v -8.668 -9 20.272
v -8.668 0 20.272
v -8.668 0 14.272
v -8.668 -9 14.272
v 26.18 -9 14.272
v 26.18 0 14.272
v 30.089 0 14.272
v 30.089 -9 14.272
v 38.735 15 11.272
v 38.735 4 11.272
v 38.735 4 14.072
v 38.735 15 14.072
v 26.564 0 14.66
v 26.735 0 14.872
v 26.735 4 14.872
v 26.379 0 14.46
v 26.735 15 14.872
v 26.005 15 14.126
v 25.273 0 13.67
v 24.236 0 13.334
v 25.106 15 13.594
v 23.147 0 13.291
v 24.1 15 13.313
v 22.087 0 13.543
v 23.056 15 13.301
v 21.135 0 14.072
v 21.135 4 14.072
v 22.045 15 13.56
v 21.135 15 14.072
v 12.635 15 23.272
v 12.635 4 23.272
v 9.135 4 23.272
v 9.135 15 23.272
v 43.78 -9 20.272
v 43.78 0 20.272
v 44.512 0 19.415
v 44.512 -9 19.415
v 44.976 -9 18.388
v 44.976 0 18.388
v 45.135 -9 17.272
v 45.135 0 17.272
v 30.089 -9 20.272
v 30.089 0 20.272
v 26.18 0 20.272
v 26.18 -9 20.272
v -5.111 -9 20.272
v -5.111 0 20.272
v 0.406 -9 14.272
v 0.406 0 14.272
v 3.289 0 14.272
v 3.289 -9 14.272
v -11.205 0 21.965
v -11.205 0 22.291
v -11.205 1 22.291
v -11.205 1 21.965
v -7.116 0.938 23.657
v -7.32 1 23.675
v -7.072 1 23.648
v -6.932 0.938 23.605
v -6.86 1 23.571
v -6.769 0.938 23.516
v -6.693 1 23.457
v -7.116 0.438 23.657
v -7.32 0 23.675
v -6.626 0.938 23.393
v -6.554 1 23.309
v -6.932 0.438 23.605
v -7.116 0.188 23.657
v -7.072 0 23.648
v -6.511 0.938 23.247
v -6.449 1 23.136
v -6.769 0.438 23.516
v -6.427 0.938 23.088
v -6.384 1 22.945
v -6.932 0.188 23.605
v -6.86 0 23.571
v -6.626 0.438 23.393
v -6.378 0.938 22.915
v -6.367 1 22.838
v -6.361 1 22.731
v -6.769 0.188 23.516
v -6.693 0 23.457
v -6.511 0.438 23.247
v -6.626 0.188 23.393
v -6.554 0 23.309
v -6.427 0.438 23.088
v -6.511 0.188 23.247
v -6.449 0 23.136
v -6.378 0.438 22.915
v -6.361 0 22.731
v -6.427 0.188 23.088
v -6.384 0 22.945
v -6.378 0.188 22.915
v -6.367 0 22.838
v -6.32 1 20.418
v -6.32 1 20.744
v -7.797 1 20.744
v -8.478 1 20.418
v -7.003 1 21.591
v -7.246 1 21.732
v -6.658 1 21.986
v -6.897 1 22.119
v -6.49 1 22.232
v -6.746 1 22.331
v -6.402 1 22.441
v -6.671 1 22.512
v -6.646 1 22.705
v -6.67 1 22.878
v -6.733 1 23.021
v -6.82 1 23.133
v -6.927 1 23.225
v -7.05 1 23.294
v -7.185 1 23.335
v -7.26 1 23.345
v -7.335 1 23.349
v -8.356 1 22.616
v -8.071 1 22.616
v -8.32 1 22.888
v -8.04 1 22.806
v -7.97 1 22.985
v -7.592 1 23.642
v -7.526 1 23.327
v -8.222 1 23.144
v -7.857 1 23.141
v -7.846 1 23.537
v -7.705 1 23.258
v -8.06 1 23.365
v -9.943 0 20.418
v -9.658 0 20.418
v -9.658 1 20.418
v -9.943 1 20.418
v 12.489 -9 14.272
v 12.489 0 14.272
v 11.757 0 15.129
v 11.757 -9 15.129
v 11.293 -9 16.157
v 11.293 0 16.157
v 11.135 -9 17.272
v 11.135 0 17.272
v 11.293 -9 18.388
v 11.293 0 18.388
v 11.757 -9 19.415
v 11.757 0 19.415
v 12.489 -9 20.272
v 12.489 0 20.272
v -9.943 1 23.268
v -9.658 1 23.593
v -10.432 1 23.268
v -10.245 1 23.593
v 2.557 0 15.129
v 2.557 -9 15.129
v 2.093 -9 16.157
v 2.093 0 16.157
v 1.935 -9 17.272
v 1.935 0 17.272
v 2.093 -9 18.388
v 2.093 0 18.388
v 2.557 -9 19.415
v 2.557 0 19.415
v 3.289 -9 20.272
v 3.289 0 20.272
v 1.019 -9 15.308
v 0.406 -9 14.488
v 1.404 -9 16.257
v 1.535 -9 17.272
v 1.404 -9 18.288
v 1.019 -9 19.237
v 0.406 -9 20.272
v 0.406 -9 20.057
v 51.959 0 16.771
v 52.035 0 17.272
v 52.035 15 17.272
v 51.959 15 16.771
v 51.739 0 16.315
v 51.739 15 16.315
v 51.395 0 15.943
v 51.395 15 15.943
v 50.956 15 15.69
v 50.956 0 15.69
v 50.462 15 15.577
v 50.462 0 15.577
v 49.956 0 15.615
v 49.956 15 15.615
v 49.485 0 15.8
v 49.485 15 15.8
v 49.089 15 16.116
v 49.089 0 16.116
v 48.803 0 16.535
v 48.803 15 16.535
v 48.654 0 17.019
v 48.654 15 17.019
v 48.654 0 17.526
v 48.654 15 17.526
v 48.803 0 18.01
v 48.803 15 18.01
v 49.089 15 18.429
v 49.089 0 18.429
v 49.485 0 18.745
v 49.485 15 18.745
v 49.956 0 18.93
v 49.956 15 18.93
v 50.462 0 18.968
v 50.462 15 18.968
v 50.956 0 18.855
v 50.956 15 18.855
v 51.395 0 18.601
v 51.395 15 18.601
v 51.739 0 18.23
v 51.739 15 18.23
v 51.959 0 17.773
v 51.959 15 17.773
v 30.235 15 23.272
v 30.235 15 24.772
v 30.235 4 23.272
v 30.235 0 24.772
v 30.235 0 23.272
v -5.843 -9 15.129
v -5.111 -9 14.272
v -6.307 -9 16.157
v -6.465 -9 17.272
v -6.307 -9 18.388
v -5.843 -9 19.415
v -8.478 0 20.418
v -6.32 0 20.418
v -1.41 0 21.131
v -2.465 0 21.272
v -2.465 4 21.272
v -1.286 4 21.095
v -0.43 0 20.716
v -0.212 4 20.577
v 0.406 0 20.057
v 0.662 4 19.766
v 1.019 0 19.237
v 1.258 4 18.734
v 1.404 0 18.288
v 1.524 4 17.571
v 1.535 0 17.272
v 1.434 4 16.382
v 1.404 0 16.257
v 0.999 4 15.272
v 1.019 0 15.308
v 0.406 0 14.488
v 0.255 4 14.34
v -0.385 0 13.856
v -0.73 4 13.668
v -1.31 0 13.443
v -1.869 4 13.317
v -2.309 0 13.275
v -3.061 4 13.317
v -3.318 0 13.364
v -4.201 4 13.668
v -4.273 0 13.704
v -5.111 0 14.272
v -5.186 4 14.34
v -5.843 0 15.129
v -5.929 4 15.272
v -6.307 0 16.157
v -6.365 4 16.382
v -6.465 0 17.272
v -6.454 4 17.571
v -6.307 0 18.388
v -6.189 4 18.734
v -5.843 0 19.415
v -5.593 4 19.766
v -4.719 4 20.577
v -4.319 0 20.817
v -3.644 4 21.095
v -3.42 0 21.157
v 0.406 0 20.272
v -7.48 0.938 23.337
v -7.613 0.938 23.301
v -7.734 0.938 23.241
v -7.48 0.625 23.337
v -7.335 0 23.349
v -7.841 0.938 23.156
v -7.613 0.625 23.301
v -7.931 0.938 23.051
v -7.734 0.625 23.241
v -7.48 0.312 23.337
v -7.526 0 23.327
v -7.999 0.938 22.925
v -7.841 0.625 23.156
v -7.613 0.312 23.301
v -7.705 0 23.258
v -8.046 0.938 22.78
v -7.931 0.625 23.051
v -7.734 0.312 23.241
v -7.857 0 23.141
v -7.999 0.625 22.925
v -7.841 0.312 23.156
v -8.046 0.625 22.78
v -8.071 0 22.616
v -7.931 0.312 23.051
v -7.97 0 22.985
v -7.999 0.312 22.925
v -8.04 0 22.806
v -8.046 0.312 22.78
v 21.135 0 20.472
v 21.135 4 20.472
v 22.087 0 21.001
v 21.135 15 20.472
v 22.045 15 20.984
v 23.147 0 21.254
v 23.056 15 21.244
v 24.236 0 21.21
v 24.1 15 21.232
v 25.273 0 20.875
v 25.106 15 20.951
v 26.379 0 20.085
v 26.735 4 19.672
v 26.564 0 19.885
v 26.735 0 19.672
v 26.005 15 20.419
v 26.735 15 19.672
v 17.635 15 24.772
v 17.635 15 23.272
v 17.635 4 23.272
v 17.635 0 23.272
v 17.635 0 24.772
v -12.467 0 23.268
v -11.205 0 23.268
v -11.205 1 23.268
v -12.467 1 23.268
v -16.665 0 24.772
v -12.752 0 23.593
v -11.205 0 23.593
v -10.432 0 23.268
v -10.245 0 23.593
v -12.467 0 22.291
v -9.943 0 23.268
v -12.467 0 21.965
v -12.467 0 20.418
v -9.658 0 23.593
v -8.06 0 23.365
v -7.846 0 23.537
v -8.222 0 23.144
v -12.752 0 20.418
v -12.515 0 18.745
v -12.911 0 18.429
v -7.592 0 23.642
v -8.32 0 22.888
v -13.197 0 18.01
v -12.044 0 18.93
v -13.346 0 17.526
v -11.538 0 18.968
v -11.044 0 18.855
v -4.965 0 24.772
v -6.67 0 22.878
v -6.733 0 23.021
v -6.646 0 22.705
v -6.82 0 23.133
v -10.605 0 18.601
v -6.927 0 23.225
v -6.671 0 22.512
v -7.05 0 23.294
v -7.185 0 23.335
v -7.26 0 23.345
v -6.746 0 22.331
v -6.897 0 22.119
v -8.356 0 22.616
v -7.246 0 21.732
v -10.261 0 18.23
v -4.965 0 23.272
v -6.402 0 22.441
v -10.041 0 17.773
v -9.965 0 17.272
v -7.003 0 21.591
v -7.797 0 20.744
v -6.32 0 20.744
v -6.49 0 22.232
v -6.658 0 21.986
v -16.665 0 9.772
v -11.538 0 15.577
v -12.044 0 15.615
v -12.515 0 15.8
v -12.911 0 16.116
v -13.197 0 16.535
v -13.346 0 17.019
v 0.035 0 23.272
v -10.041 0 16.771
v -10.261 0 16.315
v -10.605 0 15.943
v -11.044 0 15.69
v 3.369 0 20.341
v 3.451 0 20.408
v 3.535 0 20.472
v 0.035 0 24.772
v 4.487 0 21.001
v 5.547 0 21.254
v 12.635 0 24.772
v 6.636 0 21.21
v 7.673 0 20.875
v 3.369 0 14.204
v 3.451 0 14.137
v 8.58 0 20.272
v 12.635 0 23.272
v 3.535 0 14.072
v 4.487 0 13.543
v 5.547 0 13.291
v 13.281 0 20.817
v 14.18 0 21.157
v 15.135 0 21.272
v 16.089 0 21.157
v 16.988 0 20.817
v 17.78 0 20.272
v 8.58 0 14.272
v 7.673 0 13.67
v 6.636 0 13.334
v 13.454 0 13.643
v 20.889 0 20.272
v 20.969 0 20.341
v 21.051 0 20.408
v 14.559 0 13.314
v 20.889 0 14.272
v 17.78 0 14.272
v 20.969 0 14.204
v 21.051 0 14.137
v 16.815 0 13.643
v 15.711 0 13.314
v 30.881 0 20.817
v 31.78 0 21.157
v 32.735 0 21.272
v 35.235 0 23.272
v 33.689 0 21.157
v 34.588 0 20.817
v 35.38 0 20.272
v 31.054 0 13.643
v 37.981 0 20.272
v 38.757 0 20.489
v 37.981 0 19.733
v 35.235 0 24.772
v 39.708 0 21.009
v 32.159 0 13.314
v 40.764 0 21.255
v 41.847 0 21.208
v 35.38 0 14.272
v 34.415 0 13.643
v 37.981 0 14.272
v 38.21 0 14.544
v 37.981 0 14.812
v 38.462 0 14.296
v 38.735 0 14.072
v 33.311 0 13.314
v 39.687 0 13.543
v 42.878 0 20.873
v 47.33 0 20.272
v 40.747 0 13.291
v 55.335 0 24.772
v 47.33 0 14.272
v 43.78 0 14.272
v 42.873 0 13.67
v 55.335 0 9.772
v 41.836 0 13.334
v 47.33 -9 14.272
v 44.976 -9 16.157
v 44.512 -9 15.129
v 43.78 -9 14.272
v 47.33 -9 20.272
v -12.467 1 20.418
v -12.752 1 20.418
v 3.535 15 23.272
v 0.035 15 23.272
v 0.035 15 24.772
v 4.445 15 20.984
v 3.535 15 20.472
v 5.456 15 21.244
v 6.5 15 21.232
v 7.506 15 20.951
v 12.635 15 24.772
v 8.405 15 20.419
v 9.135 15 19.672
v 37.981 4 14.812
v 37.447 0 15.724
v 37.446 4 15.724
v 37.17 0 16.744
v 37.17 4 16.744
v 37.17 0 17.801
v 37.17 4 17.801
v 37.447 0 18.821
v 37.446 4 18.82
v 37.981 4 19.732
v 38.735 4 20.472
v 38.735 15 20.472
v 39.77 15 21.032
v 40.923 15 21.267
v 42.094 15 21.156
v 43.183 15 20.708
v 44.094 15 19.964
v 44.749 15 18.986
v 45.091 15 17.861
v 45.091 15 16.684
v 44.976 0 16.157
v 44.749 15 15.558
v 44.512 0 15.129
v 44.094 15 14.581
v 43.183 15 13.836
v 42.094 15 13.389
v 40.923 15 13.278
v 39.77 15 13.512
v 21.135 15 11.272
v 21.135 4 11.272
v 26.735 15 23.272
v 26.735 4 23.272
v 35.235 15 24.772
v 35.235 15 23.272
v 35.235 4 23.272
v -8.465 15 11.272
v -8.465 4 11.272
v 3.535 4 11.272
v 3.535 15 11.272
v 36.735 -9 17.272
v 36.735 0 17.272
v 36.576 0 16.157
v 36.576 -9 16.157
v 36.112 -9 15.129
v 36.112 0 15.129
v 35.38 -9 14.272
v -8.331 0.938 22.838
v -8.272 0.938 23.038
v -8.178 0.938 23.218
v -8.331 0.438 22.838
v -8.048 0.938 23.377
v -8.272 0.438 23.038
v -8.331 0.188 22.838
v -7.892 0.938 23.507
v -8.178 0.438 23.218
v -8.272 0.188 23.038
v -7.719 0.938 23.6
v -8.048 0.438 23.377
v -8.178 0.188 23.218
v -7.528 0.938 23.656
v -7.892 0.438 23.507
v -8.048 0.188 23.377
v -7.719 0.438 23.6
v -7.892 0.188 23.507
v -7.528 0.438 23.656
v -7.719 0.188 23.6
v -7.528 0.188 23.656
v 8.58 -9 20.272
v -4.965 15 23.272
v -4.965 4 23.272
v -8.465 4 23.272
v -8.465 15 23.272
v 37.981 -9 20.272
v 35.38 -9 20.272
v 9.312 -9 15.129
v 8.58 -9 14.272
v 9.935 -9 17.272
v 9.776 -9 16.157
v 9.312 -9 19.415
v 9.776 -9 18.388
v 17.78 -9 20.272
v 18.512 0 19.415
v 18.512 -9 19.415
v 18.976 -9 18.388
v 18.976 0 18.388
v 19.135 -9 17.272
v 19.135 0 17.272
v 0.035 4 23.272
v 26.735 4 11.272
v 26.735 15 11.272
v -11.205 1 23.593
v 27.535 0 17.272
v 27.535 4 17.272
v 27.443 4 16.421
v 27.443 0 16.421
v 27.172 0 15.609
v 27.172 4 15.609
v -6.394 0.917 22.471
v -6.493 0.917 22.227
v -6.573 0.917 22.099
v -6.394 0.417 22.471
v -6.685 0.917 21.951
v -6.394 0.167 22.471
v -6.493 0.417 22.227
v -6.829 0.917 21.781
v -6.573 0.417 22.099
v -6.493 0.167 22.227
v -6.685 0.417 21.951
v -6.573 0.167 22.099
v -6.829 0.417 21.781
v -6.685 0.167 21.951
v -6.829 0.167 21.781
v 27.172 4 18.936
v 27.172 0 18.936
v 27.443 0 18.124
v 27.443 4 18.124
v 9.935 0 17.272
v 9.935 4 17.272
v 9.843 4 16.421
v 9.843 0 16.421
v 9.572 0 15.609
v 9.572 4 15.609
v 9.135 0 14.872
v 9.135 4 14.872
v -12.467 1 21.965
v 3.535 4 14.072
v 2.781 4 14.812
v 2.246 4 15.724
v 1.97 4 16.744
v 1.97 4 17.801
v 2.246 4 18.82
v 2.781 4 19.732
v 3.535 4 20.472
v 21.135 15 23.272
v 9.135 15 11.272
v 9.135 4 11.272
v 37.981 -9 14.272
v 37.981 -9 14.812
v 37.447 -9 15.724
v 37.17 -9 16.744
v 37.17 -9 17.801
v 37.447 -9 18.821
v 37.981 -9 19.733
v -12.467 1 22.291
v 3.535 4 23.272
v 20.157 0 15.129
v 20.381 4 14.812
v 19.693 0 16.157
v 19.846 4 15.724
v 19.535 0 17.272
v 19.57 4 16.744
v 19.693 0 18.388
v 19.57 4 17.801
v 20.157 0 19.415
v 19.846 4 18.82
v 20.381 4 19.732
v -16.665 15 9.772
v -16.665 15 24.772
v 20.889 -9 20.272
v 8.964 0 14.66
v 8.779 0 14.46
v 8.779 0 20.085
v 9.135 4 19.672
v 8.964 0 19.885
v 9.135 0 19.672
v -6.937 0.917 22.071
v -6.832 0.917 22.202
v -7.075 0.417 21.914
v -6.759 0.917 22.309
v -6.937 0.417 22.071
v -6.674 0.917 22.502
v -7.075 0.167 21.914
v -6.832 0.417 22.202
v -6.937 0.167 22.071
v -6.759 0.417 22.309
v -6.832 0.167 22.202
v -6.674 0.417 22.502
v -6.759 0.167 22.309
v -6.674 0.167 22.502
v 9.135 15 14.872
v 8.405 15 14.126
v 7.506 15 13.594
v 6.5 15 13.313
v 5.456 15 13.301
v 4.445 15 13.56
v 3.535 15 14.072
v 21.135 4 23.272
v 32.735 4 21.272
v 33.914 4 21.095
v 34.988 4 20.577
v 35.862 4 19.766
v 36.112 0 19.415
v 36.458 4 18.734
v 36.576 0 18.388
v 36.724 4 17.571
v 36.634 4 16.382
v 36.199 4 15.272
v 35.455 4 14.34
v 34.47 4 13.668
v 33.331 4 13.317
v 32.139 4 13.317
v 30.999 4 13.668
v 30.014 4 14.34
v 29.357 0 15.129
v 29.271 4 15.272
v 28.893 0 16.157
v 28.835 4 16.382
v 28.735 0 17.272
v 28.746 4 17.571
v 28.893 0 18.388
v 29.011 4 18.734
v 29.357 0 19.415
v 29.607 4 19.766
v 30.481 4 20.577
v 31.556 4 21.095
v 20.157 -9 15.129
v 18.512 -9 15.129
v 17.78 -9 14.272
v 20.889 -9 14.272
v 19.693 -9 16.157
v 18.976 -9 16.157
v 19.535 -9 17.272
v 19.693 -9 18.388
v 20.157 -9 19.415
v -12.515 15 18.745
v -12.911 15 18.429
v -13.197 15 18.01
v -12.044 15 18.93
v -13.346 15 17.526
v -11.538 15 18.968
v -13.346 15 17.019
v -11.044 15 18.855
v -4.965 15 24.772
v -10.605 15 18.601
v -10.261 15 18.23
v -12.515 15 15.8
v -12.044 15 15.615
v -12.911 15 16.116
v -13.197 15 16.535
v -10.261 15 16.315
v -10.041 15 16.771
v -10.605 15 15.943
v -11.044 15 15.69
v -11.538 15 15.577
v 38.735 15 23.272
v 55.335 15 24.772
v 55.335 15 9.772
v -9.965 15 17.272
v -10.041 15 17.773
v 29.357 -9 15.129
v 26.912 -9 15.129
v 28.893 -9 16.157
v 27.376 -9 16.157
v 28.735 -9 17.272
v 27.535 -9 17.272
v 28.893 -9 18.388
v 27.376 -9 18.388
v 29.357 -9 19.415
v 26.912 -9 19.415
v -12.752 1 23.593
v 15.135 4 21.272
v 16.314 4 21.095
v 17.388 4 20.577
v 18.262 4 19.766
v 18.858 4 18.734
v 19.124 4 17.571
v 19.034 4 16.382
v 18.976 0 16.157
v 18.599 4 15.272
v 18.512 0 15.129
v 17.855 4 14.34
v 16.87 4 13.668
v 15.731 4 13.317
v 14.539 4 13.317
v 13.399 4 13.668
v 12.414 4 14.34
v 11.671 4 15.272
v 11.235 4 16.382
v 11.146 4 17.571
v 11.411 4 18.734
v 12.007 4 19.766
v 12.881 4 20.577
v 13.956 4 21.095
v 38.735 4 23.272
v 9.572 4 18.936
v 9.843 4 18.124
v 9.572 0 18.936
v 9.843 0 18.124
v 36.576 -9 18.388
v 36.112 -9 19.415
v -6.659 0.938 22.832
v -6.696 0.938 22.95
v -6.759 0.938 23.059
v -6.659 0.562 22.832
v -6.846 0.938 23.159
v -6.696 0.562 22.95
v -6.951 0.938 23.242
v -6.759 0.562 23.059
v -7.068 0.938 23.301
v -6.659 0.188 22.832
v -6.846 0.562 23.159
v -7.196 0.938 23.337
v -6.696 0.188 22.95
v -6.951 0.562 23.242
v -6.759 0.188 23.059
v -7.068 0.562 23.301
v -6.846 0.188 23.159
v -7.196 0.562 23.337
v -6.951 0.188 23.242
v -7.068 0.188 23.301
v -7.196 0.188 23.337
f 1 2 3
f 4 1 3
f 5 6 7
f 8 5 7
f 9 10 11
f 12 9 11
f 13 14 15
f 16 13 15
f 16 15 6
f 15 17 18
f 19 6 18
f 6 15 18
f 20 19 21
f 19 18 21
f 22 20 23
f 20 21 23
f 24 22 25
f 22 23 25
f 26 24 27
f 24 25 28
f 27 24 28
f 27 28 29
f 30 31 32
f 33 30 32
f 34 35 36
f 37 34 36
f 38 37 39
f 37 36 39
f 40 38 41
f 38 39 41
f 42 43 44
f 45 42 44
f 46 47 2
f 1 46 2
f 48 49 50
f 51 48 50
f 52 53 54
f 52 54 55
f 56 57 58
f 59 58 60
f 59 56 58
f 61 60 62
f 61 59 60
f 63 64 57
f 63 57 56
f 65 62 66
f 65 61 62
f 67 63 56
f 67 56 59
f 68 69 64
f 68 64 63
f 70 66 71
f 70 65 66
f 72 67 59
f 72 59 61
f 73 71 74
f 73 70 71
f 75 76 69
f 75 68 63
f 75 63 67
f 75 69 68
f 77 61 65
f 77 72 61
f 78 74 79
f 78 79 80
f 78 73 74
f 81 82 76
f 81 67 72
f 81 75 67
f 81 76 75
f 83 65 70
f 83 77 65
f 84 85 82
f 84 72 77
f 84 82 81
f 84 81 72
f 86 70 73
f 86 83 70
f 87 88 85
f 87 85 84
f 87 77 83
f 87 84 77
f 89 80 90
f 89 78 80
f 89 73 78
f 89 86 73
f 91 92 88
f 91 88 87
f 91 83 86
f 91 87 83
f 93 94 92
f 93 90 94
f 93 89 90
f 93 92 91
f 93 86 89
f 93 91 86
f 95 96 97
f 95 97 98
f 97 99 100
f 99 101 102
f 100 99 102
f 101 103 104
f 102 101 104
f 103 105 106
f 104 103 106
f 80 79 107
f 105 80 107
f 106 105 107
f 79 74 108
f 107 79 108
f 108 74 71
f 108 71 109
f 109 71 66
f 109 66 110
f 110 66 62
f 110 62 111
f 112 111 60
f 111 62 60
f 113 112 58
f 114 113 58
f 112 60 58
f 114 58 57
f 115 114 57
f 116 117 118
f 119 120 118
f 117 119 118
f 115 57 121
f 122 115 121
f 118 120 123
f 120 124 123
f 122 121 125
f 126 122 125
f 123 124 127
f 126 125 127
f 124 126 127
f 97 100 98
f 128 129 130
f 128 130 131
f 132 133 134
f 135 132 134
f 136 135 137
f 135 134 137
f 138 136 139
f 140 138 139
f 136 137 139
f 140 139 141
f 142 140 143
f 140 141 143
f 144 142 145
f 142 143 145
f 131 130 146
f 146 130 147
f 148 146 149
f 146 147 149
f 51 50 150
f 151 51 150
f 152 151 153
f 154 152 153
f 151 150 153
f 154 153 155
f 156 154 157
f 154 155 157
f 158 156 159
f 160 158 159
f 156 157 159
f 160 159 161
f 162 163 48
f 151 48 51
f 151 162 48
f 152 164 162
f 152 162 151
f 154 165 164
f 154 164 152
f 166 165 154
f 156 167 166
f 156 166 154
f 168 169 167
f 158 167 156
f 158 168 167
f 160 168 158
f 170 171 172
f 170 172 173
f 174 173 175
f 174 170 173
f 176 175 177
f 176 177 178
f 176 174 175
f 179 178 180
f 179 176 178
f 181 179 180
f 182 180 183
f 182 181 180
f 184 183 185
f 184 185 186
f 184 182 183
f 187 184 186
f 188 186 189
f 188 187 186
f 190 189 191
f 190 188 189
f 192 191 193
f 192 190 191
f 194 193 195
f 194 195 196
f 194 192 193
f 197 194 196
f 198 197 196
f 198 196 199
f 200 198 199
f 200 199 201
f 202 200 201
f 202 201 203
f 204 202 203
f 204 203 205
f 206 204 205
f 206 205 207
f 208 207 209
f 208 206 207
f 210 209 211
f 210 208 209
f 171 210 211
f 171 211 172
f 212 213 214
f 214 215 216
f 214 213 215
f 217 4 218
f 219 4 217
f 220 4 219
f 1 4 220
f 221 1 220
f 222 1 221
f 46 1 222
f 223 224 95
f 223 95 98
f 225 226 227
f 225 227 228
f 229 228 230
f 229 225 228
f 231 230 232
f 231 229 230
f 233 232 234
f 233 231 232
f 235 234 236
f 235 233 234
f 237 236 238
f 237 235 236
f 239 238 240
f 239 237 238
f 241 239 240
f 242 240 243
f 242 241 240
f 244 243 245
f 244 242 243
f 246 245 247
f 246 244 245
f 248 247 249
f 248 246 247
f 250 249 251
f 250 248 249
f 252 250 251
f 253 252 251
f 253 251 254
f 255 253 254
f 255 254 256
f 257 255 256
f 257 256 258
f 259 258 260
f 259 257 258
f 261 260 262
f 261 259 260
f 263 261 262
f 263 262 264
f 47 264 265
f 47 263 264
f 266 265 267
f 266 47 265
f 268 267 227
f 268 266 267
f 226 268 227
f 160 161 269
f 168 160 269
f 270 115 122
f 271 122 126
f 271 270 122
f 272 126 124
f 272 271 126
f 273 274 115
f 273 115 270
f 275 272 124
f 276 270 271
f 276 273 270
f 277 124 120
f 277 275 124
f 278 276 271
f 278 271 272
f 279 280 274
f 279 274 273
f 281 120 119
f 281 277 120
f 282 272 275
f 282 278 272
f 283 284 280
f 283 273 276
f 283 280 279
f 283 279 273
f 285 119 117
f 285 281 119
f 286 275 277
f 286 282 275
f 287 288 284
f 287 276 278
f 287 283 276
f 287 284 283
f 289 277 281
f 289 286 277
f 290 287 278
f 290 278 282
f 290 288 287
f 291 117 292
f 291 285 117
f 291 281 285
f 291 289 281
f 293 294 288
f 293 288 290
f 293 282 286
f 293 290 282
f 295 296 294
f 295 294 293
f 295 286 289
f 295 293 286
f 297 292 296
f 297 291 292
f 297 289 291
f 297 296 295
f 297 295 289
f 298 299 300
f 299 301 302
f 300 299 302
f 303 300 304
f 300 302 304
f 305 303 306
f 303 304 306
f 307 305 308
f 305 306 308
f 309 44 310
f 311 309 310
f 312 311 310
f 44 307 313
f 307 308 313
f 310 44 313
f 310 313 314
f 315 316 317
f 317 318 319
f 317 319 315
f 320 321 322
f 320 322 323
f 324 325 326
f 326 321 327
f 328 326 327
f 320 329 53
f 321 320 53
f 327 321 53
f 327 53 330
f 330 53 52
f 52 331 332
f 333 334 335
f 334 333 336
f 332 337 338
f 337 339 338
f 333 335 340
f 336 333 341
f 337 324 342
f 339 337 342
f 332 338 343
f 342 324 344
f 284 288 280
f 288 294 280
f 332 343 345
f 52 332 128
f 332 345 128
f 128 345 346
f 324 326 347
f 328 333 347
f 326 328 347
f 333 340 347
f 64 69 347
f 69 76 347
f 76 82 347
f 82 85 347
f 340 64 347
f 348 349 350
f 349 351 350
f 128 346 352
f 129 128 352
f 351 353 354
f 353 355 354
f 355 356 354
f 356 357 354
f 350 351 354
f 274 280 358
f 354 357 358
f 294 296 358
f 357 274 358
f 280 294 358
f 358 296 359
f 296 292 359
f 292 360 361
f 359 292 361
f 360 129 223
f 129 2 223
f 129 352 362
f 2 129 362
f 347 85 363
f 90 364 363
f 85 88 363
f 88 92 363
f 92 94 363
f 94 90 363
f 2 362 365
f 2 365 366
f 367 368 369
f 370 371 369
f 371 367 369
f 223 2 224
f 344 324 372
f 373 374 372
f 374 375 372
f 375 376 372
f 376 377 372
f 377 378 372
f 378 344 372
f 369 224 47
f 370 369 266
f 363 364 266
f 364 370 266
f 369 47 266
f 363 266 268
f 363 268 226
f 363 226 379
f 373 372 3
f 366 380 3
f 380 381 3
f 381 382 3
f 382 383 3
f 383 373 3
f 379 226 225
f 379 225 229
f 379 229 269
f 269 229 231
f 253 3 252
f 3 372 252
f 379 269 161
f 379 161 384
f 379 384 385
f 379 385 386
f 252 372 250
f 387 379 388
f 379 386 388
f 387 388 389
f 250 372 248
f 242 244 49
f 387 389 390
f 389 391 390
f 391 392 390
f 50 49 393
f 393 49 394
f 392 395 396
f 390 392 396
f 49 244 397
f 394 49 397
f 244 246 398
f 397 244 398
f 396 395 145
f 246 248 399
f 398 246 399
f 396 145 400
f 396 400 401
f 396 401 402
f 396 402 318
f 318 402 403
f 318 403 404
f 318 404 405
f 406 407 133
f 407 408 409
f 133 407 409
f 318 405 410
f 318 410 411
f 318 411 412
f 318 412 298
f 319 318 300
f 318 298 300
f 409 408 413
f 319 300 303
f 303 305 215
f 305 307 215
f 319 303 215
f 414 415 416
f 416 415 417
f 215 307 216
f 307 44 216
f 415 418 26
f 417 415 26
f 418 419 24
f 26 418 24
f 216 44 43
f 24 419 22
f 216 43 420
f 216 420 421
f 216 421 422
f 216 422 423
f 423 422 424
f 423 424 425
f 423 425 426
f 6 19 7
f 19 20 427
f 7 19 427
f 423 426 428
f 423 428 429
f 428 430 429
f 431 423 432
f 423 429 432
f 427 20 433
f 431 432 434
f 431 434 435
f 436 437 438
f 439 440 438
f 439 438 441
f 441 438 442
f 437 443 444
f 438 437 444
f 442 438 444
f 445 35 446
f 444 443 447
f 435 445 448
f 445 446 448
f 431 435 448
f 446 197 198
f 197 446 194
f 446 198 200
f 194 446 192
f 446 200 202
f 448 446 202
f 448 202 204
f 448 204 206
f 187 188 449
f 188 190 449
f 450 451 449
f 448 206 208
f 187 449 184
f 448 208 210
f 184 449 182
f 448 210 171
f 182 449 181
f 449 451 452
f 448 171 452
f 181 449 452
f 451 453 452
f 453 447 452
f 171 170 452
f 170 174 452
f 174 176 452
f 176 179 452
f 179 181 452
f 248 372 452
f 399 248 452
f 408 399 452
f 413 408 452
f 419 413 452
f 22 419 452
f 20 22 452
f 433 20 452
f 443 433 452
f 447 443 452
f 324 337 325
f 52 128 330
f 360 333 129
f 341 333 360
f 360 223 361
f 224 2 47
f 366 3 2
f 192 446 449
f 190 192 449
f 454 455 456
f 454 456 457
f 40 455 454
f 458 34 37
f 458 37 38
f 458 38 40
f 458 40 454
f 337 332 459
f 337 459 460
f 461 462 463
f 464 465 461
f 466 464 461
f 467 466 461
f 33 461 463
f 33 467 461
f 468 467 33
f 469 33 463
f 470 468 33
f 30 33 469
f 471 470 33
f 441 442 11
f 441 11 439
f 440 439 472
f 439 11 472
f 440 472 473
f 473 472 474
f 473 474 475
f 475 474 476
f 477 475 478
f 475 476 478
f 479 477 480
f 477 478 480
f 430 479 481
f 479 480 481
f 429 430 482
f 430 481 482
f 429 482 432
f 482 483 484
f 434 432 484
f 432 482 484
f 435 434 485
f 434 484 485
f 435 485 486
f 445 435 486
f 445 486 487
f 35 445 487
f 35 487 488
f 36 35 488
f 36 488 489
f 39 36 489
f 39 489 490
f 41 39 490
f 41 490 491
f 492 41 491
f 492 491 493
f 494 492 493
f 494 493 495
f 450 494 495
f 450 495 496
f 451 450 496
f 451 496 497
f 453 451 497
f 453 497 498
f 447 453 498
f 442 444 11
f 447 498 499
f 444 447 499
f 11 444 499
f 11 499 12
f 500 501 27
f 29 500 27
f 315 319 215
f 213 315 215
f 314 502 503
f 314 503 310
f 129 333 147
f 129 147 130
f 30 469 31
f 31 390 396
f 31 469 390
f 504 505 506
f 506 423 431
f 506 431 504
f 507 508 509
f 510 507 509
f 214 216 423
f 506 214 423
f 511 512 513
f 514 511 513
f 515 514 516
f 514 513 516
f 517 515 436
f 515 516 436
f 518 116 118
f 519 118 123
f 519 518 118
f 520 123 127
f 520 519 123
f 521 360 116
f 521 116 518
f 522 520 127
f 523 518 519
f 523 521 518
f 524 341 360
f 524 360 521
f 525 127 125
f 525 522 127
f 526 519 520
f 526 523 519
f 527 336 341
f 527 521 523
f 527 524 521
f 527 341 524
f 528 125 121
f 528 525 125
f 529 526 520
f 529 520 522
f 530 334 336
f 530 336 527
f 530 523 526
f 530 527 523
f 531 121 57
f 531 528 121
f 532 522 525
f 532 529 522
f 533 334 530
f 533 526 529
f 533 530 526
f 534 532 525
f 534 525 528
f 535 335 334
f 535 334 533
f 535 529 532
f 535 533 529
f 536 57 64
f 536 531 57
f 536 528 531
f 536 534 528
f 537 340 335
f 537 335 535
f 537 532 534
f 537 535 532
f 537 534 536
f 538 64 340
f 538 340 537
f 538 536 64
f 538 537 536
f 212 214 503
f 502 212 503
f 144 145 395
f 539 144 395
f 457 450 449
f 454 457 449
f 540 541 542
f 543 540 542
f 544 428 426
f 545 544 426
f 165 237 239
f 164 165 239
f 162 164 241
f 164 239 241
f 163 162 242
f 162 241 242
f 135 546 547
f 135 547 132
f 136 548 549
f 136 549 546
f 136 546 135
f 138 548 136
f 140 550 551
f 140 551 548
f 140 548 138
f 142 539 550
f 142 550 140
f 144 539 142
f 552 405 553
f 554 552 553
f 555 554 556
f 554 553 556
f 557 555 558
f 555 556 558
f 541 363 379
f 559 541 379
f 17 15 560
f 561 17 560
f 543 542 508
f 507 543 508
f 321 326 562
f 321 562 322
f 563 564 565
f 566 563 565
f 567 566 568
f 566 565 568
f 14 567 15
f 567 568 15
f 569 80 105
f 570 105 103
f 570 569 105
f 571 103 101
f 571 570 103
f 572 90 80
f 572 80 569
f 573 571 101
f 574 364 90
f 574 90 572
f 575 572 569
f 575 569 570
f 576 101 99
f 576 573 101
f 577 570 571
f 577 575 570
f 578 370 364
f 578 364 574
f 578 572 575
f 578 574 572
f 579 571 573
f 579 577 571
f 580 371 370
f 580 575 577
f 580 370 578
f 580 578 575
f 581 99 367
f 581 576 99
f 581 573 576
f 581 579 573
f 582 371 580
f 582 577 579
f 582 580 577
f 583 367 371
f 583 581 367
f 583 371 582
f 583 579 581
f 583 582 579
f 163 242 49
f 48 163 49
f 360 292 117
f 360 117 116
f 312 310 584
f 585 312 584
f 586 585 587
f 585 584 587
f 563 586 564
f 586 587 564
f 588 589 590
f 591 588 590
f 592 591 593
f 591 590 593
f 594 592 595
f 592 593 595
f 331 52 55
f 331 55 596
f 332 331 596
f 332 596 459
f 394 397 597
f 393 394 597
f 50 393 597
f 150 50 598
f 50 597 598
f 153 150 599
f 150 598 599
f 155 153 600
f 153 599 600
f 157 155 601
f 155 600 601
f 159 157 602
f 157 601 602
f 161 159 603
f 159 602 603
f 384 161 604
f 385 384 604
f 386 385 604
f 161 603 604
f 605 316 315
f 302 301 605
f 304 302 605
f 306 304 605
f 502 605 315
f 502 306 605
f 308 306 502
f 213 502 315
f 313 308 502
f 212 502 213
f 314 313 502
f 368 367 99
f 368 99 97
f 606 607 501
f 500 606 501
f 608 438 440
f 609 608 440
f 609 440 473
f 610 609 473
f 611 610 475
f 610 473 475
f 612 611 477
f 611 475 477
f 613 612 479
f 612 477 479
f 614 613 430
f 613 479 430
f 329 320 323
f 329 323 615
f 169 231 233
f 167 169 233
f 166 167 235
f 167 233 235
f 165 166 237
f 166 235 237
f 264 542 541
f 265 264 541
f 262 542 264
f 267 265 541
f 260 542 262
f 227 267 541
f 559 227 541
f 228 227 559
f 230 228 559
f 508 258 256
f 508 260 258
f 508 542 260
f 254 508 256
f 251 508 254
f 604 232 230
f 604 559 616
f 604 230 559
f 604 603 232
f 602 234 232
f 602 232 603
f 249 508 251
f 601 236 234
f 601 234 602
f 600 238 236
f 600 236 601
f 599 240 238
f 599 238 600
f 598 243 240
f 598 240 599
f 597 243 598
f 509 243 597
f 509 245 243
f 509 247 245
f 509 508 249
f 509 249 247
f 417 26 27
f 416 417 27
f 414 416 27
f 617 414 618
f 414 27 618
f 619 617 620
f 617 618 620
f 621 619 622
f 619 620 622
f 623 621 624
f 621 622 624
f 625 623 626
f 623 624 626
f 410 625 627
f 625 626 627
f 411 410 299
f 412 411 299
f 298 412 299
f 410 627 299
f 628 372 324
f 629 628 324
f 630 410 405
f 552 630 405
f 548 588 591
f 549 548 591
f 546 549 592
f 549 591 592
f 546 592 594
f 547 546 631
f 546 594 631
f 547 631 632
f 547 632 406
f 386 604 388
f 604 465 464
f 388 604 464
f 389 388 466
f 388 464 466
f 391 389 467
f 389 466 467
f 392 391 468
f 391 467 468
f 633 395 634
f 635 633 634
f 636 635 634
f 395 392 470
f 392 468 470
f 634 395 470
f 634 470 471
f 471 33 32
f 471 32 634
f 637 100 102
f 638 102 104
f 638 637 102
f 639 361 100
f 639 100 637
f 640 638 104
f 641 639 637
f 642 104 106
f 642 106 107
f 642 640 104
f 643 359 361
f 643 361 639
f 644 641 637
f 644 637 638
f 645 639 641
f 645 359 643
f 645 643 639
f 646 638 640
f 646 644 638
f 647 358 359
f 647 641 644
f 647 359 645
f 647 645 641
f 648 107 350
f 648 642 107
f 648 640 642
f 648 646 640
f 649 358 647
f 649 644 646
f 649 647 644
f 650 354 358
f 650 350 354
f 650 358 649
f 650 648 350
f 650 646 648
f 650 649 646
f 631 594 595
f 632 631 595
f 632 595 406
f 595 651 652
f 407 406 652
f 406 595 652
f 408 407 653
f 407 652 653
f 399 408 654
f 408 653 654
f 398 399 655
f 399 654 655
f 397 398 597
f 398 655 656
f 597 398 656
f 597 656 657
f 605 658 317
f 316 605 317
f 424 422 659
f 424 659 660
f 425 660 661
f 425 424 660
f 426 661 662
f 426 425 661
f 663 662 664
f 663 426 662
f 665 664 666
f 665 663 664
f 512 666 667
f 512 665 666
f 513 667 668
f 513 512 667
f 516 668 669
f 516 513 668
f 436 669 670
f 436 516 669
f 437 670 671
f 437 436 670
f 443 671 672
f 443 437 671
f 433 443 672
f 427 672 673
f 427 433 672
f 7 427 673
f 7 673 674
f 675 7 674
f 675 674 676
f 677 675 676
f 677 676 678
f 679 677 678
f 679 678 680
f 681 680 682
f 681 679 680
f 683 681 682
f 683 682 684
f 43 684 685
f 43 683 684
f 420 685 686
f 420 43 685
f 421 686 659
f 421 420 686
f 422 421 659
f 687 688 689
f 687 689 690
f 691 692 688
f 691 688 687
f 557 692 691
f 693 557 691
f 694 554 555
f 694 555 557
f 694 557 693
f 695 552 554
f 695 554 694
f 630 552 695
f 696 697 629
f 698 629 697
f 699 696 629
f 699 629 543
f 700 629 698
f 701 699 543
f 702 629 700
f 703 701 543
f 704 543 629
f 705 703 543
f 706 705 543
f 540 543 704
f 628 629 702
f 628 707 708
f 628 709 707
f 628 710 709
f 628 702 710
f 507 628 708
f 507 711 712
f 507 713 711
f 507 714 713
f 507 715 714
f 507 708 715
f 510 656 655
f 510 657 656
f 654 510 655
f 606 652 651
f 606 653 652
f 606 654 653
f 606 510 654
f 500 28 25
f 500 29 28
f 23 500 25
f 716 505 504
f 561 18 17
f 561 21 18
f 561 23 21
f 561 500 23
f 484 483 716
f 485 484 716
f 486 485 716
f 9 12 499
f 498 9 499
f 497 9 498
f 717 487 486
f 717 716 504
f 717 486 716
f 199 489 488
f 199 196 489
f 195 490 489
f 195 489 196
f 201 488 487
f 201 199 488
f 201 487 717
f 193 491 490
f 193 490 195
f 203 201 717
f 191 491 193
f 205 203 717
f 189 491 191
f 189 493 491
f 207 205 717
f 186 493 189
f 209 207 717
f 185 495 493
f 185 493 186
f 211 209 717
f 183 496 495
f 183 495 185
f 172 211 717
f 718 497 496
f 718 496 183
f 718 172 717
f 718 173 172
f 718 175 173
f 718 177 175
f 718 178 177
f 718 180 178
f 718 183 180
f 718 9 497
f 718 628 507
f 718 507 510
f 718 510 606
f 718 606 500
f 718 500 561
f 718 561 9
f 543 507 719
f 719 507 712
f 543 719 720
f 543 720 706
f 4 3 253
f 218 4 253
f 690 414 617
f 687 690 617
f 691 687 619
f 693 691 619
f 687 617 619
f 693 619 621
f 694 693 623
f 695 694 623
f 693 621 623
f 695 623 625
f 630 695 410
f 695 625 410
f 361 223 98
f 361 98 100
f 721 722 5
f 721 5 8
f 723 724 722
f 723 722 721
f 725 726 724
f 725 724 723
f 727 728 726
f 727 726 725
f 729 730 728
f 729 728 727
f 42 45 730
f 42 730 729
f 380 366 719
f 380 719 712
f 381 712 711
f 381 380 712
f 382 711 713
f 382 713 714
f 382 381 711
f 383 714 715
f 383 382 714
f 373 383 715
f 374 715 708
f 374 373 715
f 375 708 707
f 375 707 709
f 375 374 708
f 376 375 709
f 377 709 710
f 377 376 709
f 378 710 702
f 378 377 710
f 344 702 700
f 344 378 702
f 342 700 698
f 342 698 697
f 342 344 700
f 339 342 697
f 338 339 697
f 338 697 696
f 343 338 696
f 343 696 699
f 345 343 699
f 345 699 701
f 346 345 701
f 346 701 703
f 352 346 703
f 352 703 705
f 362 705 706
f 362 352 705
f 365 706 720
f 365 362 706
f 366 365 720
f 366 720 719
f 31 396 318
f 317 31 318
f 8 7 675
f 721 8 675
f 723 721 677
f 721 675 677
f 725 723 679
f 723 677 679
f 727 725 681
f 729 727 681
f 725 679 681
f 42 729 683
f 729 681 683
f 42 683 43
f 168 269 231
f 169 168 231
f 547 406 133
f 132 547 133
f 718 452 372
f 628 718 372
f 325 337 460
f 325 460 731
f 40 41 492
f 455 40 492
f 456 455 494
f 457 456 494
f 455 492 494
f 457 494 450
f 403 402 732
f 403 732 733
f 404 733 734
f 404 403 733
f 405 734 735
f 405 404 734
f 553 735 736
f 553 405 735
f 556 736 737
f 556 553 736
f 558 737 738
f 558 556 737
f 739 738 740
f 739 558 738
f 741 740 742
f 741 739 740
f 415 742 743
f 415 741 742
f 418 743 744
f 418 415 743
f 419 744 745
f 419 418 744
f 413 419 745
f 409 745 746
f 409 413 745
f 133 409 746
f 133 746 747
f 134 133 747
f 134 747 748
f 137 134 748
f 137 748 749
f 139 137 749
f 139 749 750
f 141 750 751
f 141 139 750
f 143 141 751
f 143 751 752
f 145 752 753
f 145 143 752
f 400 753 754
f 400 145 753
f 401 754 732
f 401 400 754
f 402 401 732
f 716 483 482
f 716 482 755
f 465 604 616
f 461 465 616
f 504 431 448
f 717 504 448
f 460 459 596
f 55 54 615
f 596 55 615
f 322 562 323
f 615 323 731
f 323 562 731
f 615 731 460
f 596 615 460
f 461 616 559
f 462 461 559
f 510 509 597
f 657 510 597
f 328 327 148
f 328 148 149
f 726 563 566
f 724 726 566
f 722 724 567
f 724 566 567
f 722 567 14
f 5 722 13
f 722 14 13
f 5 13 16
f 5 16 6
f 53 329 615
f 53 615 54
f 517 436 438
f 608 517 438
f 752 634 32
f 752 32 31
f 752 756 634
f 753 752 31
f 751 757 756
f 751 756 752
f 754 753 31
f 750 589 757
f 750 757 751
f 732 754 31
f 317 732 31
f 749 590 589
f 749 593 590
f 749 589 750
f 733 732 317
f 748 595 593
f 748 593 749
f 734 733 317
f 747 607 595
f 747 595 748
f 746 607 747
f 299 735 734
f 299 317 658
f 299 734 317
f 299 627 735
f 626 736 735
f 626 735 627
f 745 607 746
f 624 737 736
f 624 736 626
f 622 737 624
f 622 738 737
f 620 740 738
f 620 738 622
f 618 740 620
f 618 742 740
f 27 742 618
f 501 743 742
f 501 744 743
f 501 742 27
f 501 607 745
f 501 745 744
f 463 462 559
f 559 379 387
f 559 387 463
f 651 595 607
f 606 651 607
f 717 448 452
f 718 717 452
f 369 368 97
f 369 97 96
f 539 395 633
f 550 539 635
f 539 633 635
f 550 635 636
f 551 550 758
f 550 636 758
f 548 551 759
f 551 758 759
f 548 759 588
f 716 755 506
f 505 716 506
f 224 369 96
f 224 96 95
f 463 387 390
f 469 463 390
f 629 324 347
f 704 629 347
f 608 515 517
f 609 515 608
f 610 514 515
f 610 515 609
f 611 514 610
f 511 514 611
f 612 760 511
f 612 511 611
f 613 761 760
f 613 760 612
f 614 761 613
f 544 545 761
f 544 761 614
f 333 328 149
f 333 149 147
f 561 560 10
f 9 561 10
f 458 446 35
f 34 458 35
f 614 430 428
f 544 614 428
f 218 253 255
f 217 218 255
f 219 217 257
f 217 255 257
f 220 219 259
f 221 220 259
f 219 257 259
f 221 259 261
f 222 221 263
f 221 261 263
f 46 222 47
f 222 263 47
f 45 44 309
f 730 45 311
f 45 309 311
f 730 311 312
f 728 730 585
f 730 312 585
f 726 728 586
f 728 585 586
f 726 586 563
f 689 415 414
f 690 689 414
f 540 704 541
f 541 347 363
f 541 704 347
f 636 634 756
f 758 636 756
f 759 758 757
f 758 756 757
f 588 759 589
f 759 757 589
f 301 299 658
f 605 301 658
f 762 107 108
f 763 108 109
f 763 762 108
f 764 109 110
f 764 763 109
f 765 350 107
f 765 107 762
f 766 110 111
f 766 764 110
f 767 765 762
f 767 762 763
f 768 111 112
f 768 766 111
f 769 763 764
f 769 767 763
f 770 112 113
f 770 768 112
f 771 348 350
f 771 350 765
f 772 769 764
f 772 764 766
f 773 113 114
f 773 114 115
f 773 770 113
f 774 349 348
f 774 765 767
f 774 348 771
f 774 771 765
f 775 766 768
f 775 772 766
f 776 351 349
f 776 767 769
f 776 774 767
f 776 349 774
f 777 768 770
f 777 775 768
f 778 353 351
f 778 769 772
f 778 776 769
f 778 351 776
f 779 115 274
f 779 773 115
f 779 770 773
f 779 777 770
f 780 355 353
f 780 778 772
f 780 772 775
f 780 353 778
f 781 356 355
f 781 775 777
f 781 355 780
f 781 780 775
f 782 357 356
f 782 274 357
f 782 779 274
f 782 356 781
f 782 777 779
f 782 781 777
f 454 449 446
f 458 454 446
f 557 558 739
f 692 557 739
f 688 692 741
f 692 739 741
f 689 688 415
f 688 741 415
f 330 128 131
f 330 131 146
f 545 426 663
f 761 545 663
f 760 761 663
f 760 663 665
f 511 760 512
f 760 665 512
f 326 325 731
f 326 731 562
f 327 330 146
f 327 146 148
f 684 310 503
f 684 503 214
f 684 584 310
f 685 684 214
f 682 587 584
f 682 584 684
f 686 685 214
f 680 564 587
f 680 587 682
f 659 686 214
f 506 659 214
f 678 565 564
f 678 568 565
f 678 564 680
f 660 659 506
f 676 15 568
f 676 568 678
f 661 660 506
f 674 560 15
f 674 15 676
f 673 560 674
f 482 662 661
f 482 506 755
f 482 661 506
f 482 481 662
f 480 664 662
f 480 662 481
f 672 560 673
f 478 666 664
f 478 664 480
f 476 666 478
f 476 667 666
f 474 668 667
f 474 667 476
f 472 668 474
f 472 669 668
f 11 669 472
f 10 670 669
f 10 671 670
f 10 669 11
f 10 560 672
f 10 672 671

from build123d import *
from build123d.topology import SkipClean

# Parameters (mm, degrees)
SKETCH1_W             = 12
SKETCH1_H             = 12
SKETCH1_R             = 4
BOSS_EXTRUDE1_DEPTH   = 4
BOSS_EXTRUDE1_2_DEPTH = 4
BOSS_EXTRUDE1_3_DEPTH = 4
SKETCH1_3_R           = 1.7
BOSS_EXTRUDE2_DEPTH   = 15
SKETCH4_R             = 4
CUT_EXTRUDE1_DEPTH    = 63.454801186
CUT_EXTRUDE2_DEPTH    = 1
BOSS_EXTRUDE4_DEPTH   = 9


with BuildPart() as part:
    # Sketch1 → Boss-Extrude1 (new body)
    with BuildSketch(Plane(origin=(0, 0, 0), x_dir=(1, 0, 0), z_dir=(0, 1, 0))):
        with Locations((32.734732638, -17.272355561)):
            Rectangle(SKETCH1_W, SKETCH1_H)
        with Locations((32.734732638, -17.272355561)):
            Circle(SKETCH1_R, mode=Mode.SUBTRACT)
    extrude(amount=BOSS_EXTRUDE1_DEPTH)



with BuildPart() as body_2:
    # Sketch1 → Boss-Extrude1 2 (new body)
    with BuildSketch(Plane(origin=(0, 0, 0), x_dir=(1, 0, 0), z_dir=(0, 1, 0))):
        with Locations((15.134732638, -17.272354652)):
            Rectangle(SKETCH1_W, SKETCH1_H)
        with Locations((15.134732638, -17.272354652)):
            Circle(SKETCH1_R, mode=Mode.SUBTRACT)
    extrude(amount=BOSS_EXTRUDE1_2_DEPTH)


with BuildPart() as body_3:
    # Sketch1 → Boss-Extrude1 3 (new body)
    with BuildSketch(Plane(origin=(0, 0, 0), x_dir=(1, 0, 0), z_dir=(0, 1, 0))):
        with Locations((-2.465267362, -17.272354652)):
            Rectangle(SKETCH1_W, SKETCH1_H)
        with Locations((-2.465267362, -17.272354652)):
            Circle(SKETCH1_R, mode=Mode.SUBTRACT)
    extrude(amount=BOSS_EXTRUDE1_3_DEPTH)


with BuildPart() as part_1:
    add(part.part)

    add(body_2.part)  # Boss-Extrude2 merges body 2

    add(body_3.part)  # Boss-Extrude2 merges body 3
    # Sketch1<3> → Boss-Extrude2 (add)
    with BuildSketch(Plane(origin=(0, 0, 0), x_dir=(1, 0, 0), z_dir=(0, 1, 0))):
        Polygon((35.234732638, -24.772354652), (55.334732638, -24.772354652), (55.334732638, -9.772354652), (-16.665267362, -9.772354652), (-16.665267362, -24.772354652), (-4.965267362, -24.772354652), (-4.965267362, -23.272354652), (-8.465267362, -23.272354652), (-8.465267362, -11.272354652), (3.534732638, -11.272354652), (3.534732638, -23.272354652), (0.034732638, -23.272354652), (0.034732638, -24.772354652), (12.634732638, -24.772354652), (12.634732638, -23.272354652), (9.134732638, -23.272354652), (9.134732638, -11.272354652), (21.134732638, -11.272354652), (21.134732638, -23.272354652), (17.634732638, -23.272354652), (17.634732638, -24.772354652), (30.234732638, -24.772354652), (30.234732638, -23.272355561), (26.734732638, -23.272355561), (26.734732638, -11.272355561), (38.734732638, -11.272355561), (38.734732638, -23.272355561), (35.234732638, -23.272355561), align=None)
        with Locations((-11.665267362, -17.272354652)):
            Circle(SKETCH1_3_R, mode=Mode.SUBTRACT)
        with Locations((50.334732638, -17.272354652)):
            Circle(SKETCH1_3_R, mode=Mode.SUBTRACT)
    extrude(amount=BOSS_EXTRUDE2_DEPTH)

    # Sketch4 → Cut-Extrude1 (cut, through all)
    with BuildSketch(Plane(origin=(0, 15, 0), x_dir=(1, 0, 0), z_dir=(0, 1, 0))):
        with Locations((5.934732638, -17.272354652)):
            Circle(SKETCH4_R)
        with Locations((23.534732638, -17.272354652)):
            Circle(SKETCH4_R)
        with Locations((41.134732638, -17.272354652)):
            Circle(SKETCH4_R)
    extrude(amount=-CUT_EXTRUDE1_DEPTH, mode=Mode.SUBTRACT)

    # Sketch3 → Cut-Extrude2 (cut)
    with BuildSketch(Plane.XZ):
        Polygon((-12.75177101, 23.593176671), (-11.204976138, 23.593176671), (-11.204976138, 23.267535646), (-12.466835112, 23.267535646), (-12.466835112, 22.290612569), (-11.204976138, 22.290612569), (-11.204976138, 21.964971543), (-12.466835112, 21.964971543), (-12.466835112, 20.418176671), (-12.75177101, 20.418176671), align=None)
        Polygon((-10.245225537, 23.593176671), (-9.658181266, 23.593176671), (-9.658181266, 20.418176671), (-9.943117163, 20.418176671), (-9.943117163, 23.267535646), (-10.431578702, 23.267535646), align=None)
        with BuildLine():
            Line((-8.070681266, 22.616253594), (-8.355617163, 22.616253594))
            add(Edge.make_bspline(
                [(-8.355617163, 22.616253594), (-8.353760103, 22.654055042), (-8.350112886, 22.728296081), (-8.333032938, 22.83653991), (-8.308593714, 22.940003906), (-8.274039323, 23.037857328), (-8.231125771, 23.130965389), (-8.179663532, 23.21895826), (-8.118709111, 23.301500267), (-8.049578716, 23.377826218), (-7.974495737, 23.447846371), (-7.893482492, 23.508312199), (-7.808351645, 23.559400372), (-7.719361476, 23.602109784), (-7.625507965, 23.634168073), (-7.527642801, 23.657954846), (-7.425336013, 23.672266246), (-7.355631136, 23.673804565), (-7.320180465, 23.674586928)],
                knots=[0, 0, 0, 0, 1.10065271, 2.161652631, 3.183658789, 4.190468796, 5.17591951, 6.163126047, 7.15150782, 8.156236427, 9.156009102, 10.134482811, 11.092018607, 12.041330605, 13.001268258, 13.972401359, 14.968799086, 16, 16, 16, 16], degree=3))
            add(Edge.make_bspline(
                [(-7.320180465, 23.674586928), (-7.285366069, 23.673771899), (-7.216957025, 23.672170398), (-7.117115055, 23.658417178), (-7.02206708, 23.636876534), (-6.931998892, 23.606654693), (-6.847629105, 23.566028819), (-6.768323915, 23.517226766), (-6.693139179, 23.460784491), (-6.625460168, 23.394332817), (-6.563313553, 23.323392082), (-6.509699365, 23.247656627), (-6.463785995, 23.169434346), (-6.425515743, 23.088128764), (-6.397343388, 23.002974331), (-6.375954585, 22.915210797), (-6.363864717, 22.823929718), (-6.362009226, 22.762147343), (-6.361065881, 22.730736767)],
                knots=[0, 0, 0, 0, 1.111607364, 2.184268762, 3.212621178, 4.221274766, 5.211760367, 6.196651075, 7.1921475, 8.207485113, 9.220403448, 10.201281604, 11.166441695, 12.114753415, 13.065576456, 14.026450734, 14.996634279, 16, 16, 16, 16], degree=3))
            add(Edge.make_bspline(
                [(-6.361065881, 22.730736767), (-6.362595909, 22.686513726), (-6.365629115, 22.598843695), (-6.39180536, 22.469844028), (-6.432247691, 22.344744439), (-6.481299653, 22.244070584), (-6.530848311, 22.163355831), (-6.574554268, 22.096303785), (-6.626853188, 22.024796965), (-6.687266556, 21.948115173), (-6.754882994, 21.866023852), (-6.830189157, 21.778489314), (-6.913760319, 21.686441251), (-6.972414527, 21.623570978), (-7.002807668, 21.590993178)],
                knots=[0, 0, 0, 0, 1.184203166, 2.347625244, 3.513805382, 4.700623107, 5.337941753, 6.051866363, 6.845199593, 7.711357327, 8.668078039, 9.695487809, 10.805859518, 12, 12, 12, 12], degree=3))
            Line((-7.002807668, 21.590993178), (-7.797193686, 20.743817697))
            Line((-7.797193686, 20.743817697), (-6.320360753, 20.743817697))
            Line((-6.320360753, 20.743817697), (-6.320360753, 20.418176671))
            Line((-6.320360753, 20.418176671), (-8.477732548, 20.418176671))
            Line((-8.477732548, 20.418176671), (-7.24640242, 21.732189091))
            add(Edge.make_bspline(
                [(-7.24640242, 21.732189091), (-7.216423265, 21.763483983), (-7.158839445, 21.823595067), (-7.077393822, 21.911354752), (-7.004242739, 21.992770407), (-6.938912676, 22.067688205), (-6.882820853, 22.137203984), (-6.8330439, 22.199066322), (-6.793160828, 22.255993574), (-6.749876148, 22.321979702), (-6.707953465, 22.402545161), (-6.671928685, 22.501000722), (-6.649962358, 22.602353301), (-6.647327257, 22.670844435), (-6.646001779, 22.705296062)],
                knots=[0, 0, 0, 0, 1.329631726, 2.553950428, 3.673215718, 4.687767853, 5.603093632, 6.413772471, 7.123043292, 7.734684054, 8.834405432, 9.900288307, 10.943827018, 12, 12, 12, 12], degree=3))
            add(Edge.make_bspline(
                [(-6.646001779, 22.705296062), (-6.646578488, 22.726959902), (-6.647715071, 22.769655171), (-6.657745982, 22.832253252), (-6.672904798, 22.892637048), (-6.694626568, 22.950992295), (-6.723298397, 23.006732279), (-6.758199248, 23.059924851), (-6.798467377, 23.11134984), (-6.845050314, 23.159567475), (-6.896223622, 23.203728283), (-6.95028412, 23.242847989), (-7.007479571, 23.275540611), (-7.067568825, 23.302340783), (-7.130384358, 23.323364165), (-7.196047662, 23.337931591), (-7.264377306, 23.347077844), (-7.311034834, 23.348315343), (-7.33480887, 23.348945902)],
                knots=[0, 0, 0, 0, 0.991446411, 1.95395049, 2.89581595, 3.838931463, 4.798493298, 5.75982156, 6.748411868, 7.785213223, 8.824556874, 9.840280684, 10.836137867, 11.835679398, 12.848801643, 13.863922112, 14.911575587, 16, 16, 16, 16], degree=3))
            add(Edge.make_bspline(
                [(-7.33480887, 23.348945902), (-7.359638126, 23.348297266), (-7.408398684, 23.347023451), (-7.479989521, 23.338112891), (-7.548284476, 23.322740593), (-7.613455345, 23.301716039), (-7.675612398, 23.274992926), (-7.734453352, 23.241708272), (-7.789846116, 23.201990389), (-7.841894819, 23.156959313), (-7.88985, 23.106823704), (-7.931983952, 23.050934666), (-7.96879945, 22.990312653), (-8.000920684, 22.925121239), (-8.027006203, 22.854768882), (-8.046938989, 22.779505321), (-8.062711343, 22.699657354), (-8.067980501, 22.644516598), (-8.070681266, 22.616253594)],
                knots=[0, 0, 0, 0, 1.031018746, 2.02475058, 2.990194455, 3.934040569, 4.864654155, 5.795059489, 6.735614925, 7.690564532, 8.649604399, 9.611025574, 10.590972636, 11.591080095, 12.624614302, 13.701020113, 14.821632451, 16, 16, 16, 16], degree=3))
        make_face()
    extrude(amount=-CUT_EXTRUDE2_DEPTH, mode=Mode.SUBTRACT)

    # Sketch5 → Boss-Extrude4 (add)
    with SkipClean():  # the faces are left unmerged after this step: merging them gives an invalid solid
        with BuildSketch(Plane.XZ):
            with BuildLine():
                ThreePointArc((0.406157251, 20.057120476), (1.534732638, 17.272354652), (0.406157251, 14.487588828))
                Line((0.406157251, 14.487588828), (0.406157251, 14.272354652))
                Line((0.406157251, 14.272354652), (3.288981327, 14.272354652))
                ThreePointArc((3.288981327, 14.272354652), (1.934732638, 17.272354652), (3.288981327, 20.272354652))
                Line((3.288981327, 20.272354652), (0.406157251, 20.272354652))
                Line((0.406157251, 20.272354652), (0.406157251, 20.057120476))
            make_face()
            with BuildLine():
                Line((-8.668139711, 14.272354652), (-5.111018673, 14.272354652))
                ThreePointArc((-5.111018673, 14.272354652), (-6.465267362, 17.272354652), (-5.111018673, 20.272354652))
                Line((-5.111018673, 20.272354652), (-8.668139711, 20.272354652))
                Line((-8.668139711, 20.272354652), (-8.668139711, 14.272354652))
            make_face()
            with BuildLine():
                ThreePointArc((8.580483949, 20.272354652), (9.934732638, 17.272354652), (8.580483949, 14.272354652))
                Line((8.580483949, 14.272354652), (12.488981327, 14.272354652))
                ThreePointArc((12.488981327, 14.272354652), (11.134732638, 17.272354652), (12.488981327, 20.272354652))
                Line((12.488981327, 20.272354652), (8.580483949, 20.272354652))
            make_face()
            with BuildLine():
                ThreePointArc((17.780483949, 20.272354652), (19.134732638, 17.272354652), (17.780483949, 14.272354652))
                Line((17.780483949, 14.272354652), (20.888981327, 14.272354652))
                ThreePointArc((20.888981327, 14.272354652), (19.534732638, 17.272354652), (20.888981327, 20.272354652))
                Line((20.888981327, 20.272354652), (17.780483949, 20.272354652))
            make_face()
            with BuildLine():
                ThreePointArc((26.180483949, 20.272354652), (27.534732638, 17.272354652), (26.180483949, 14.272354652))
                Line((26.180483949, 14.272354652), (30.088982357, 14.272354652))
                ThreePointArc((30.088982357, 14.272354652), (28.734732638, 17.272354187), (30.088980297, 20.272354652))
                Line((30.088980297, 20.272354652), (26.180483949, 20.272354652))
            make_face()
            with BuildLine():
                ThreePointArc((35.380484979, 20.272354652), (36.734732638, 17.272354187), (35.380482919, 14.272354652))
                Line((35.380482919, 14.272354652), (37.980901679, 14.272354652))
                Line((37.980901679, 14.272354652), (37.980901679, 14.81199893))
                ThreePointArc((37.980901679, 14.81199893), (37.134732638, 17.272354652), (37.980901679, 19.732710374))
                Line((37.980901679, 19.732710374), (37.980901679, 20.272354652))
                Line((37.980901679, 20.272354652), (35.380484979, 20.272354652))
            make_face()
            with BuildLine():
                ThreePointArc((43.780483949, 20.272354652), (45.134732638, 17.272354652), (43.780483949, 14.272354652))
                Line((43.780483949, 14.272354652), (47.330399458, 14.272354652))
                Line((47.330399458, 14.272354652), (47.330399458, 20.272354652))
                Line((47.330399458, 20.272354652), (43.780483949, 20.272354652))
            make_face()
        extrude(amount=BOSS_EXTRUDE4_DEPTH)


solid = part_1.part
